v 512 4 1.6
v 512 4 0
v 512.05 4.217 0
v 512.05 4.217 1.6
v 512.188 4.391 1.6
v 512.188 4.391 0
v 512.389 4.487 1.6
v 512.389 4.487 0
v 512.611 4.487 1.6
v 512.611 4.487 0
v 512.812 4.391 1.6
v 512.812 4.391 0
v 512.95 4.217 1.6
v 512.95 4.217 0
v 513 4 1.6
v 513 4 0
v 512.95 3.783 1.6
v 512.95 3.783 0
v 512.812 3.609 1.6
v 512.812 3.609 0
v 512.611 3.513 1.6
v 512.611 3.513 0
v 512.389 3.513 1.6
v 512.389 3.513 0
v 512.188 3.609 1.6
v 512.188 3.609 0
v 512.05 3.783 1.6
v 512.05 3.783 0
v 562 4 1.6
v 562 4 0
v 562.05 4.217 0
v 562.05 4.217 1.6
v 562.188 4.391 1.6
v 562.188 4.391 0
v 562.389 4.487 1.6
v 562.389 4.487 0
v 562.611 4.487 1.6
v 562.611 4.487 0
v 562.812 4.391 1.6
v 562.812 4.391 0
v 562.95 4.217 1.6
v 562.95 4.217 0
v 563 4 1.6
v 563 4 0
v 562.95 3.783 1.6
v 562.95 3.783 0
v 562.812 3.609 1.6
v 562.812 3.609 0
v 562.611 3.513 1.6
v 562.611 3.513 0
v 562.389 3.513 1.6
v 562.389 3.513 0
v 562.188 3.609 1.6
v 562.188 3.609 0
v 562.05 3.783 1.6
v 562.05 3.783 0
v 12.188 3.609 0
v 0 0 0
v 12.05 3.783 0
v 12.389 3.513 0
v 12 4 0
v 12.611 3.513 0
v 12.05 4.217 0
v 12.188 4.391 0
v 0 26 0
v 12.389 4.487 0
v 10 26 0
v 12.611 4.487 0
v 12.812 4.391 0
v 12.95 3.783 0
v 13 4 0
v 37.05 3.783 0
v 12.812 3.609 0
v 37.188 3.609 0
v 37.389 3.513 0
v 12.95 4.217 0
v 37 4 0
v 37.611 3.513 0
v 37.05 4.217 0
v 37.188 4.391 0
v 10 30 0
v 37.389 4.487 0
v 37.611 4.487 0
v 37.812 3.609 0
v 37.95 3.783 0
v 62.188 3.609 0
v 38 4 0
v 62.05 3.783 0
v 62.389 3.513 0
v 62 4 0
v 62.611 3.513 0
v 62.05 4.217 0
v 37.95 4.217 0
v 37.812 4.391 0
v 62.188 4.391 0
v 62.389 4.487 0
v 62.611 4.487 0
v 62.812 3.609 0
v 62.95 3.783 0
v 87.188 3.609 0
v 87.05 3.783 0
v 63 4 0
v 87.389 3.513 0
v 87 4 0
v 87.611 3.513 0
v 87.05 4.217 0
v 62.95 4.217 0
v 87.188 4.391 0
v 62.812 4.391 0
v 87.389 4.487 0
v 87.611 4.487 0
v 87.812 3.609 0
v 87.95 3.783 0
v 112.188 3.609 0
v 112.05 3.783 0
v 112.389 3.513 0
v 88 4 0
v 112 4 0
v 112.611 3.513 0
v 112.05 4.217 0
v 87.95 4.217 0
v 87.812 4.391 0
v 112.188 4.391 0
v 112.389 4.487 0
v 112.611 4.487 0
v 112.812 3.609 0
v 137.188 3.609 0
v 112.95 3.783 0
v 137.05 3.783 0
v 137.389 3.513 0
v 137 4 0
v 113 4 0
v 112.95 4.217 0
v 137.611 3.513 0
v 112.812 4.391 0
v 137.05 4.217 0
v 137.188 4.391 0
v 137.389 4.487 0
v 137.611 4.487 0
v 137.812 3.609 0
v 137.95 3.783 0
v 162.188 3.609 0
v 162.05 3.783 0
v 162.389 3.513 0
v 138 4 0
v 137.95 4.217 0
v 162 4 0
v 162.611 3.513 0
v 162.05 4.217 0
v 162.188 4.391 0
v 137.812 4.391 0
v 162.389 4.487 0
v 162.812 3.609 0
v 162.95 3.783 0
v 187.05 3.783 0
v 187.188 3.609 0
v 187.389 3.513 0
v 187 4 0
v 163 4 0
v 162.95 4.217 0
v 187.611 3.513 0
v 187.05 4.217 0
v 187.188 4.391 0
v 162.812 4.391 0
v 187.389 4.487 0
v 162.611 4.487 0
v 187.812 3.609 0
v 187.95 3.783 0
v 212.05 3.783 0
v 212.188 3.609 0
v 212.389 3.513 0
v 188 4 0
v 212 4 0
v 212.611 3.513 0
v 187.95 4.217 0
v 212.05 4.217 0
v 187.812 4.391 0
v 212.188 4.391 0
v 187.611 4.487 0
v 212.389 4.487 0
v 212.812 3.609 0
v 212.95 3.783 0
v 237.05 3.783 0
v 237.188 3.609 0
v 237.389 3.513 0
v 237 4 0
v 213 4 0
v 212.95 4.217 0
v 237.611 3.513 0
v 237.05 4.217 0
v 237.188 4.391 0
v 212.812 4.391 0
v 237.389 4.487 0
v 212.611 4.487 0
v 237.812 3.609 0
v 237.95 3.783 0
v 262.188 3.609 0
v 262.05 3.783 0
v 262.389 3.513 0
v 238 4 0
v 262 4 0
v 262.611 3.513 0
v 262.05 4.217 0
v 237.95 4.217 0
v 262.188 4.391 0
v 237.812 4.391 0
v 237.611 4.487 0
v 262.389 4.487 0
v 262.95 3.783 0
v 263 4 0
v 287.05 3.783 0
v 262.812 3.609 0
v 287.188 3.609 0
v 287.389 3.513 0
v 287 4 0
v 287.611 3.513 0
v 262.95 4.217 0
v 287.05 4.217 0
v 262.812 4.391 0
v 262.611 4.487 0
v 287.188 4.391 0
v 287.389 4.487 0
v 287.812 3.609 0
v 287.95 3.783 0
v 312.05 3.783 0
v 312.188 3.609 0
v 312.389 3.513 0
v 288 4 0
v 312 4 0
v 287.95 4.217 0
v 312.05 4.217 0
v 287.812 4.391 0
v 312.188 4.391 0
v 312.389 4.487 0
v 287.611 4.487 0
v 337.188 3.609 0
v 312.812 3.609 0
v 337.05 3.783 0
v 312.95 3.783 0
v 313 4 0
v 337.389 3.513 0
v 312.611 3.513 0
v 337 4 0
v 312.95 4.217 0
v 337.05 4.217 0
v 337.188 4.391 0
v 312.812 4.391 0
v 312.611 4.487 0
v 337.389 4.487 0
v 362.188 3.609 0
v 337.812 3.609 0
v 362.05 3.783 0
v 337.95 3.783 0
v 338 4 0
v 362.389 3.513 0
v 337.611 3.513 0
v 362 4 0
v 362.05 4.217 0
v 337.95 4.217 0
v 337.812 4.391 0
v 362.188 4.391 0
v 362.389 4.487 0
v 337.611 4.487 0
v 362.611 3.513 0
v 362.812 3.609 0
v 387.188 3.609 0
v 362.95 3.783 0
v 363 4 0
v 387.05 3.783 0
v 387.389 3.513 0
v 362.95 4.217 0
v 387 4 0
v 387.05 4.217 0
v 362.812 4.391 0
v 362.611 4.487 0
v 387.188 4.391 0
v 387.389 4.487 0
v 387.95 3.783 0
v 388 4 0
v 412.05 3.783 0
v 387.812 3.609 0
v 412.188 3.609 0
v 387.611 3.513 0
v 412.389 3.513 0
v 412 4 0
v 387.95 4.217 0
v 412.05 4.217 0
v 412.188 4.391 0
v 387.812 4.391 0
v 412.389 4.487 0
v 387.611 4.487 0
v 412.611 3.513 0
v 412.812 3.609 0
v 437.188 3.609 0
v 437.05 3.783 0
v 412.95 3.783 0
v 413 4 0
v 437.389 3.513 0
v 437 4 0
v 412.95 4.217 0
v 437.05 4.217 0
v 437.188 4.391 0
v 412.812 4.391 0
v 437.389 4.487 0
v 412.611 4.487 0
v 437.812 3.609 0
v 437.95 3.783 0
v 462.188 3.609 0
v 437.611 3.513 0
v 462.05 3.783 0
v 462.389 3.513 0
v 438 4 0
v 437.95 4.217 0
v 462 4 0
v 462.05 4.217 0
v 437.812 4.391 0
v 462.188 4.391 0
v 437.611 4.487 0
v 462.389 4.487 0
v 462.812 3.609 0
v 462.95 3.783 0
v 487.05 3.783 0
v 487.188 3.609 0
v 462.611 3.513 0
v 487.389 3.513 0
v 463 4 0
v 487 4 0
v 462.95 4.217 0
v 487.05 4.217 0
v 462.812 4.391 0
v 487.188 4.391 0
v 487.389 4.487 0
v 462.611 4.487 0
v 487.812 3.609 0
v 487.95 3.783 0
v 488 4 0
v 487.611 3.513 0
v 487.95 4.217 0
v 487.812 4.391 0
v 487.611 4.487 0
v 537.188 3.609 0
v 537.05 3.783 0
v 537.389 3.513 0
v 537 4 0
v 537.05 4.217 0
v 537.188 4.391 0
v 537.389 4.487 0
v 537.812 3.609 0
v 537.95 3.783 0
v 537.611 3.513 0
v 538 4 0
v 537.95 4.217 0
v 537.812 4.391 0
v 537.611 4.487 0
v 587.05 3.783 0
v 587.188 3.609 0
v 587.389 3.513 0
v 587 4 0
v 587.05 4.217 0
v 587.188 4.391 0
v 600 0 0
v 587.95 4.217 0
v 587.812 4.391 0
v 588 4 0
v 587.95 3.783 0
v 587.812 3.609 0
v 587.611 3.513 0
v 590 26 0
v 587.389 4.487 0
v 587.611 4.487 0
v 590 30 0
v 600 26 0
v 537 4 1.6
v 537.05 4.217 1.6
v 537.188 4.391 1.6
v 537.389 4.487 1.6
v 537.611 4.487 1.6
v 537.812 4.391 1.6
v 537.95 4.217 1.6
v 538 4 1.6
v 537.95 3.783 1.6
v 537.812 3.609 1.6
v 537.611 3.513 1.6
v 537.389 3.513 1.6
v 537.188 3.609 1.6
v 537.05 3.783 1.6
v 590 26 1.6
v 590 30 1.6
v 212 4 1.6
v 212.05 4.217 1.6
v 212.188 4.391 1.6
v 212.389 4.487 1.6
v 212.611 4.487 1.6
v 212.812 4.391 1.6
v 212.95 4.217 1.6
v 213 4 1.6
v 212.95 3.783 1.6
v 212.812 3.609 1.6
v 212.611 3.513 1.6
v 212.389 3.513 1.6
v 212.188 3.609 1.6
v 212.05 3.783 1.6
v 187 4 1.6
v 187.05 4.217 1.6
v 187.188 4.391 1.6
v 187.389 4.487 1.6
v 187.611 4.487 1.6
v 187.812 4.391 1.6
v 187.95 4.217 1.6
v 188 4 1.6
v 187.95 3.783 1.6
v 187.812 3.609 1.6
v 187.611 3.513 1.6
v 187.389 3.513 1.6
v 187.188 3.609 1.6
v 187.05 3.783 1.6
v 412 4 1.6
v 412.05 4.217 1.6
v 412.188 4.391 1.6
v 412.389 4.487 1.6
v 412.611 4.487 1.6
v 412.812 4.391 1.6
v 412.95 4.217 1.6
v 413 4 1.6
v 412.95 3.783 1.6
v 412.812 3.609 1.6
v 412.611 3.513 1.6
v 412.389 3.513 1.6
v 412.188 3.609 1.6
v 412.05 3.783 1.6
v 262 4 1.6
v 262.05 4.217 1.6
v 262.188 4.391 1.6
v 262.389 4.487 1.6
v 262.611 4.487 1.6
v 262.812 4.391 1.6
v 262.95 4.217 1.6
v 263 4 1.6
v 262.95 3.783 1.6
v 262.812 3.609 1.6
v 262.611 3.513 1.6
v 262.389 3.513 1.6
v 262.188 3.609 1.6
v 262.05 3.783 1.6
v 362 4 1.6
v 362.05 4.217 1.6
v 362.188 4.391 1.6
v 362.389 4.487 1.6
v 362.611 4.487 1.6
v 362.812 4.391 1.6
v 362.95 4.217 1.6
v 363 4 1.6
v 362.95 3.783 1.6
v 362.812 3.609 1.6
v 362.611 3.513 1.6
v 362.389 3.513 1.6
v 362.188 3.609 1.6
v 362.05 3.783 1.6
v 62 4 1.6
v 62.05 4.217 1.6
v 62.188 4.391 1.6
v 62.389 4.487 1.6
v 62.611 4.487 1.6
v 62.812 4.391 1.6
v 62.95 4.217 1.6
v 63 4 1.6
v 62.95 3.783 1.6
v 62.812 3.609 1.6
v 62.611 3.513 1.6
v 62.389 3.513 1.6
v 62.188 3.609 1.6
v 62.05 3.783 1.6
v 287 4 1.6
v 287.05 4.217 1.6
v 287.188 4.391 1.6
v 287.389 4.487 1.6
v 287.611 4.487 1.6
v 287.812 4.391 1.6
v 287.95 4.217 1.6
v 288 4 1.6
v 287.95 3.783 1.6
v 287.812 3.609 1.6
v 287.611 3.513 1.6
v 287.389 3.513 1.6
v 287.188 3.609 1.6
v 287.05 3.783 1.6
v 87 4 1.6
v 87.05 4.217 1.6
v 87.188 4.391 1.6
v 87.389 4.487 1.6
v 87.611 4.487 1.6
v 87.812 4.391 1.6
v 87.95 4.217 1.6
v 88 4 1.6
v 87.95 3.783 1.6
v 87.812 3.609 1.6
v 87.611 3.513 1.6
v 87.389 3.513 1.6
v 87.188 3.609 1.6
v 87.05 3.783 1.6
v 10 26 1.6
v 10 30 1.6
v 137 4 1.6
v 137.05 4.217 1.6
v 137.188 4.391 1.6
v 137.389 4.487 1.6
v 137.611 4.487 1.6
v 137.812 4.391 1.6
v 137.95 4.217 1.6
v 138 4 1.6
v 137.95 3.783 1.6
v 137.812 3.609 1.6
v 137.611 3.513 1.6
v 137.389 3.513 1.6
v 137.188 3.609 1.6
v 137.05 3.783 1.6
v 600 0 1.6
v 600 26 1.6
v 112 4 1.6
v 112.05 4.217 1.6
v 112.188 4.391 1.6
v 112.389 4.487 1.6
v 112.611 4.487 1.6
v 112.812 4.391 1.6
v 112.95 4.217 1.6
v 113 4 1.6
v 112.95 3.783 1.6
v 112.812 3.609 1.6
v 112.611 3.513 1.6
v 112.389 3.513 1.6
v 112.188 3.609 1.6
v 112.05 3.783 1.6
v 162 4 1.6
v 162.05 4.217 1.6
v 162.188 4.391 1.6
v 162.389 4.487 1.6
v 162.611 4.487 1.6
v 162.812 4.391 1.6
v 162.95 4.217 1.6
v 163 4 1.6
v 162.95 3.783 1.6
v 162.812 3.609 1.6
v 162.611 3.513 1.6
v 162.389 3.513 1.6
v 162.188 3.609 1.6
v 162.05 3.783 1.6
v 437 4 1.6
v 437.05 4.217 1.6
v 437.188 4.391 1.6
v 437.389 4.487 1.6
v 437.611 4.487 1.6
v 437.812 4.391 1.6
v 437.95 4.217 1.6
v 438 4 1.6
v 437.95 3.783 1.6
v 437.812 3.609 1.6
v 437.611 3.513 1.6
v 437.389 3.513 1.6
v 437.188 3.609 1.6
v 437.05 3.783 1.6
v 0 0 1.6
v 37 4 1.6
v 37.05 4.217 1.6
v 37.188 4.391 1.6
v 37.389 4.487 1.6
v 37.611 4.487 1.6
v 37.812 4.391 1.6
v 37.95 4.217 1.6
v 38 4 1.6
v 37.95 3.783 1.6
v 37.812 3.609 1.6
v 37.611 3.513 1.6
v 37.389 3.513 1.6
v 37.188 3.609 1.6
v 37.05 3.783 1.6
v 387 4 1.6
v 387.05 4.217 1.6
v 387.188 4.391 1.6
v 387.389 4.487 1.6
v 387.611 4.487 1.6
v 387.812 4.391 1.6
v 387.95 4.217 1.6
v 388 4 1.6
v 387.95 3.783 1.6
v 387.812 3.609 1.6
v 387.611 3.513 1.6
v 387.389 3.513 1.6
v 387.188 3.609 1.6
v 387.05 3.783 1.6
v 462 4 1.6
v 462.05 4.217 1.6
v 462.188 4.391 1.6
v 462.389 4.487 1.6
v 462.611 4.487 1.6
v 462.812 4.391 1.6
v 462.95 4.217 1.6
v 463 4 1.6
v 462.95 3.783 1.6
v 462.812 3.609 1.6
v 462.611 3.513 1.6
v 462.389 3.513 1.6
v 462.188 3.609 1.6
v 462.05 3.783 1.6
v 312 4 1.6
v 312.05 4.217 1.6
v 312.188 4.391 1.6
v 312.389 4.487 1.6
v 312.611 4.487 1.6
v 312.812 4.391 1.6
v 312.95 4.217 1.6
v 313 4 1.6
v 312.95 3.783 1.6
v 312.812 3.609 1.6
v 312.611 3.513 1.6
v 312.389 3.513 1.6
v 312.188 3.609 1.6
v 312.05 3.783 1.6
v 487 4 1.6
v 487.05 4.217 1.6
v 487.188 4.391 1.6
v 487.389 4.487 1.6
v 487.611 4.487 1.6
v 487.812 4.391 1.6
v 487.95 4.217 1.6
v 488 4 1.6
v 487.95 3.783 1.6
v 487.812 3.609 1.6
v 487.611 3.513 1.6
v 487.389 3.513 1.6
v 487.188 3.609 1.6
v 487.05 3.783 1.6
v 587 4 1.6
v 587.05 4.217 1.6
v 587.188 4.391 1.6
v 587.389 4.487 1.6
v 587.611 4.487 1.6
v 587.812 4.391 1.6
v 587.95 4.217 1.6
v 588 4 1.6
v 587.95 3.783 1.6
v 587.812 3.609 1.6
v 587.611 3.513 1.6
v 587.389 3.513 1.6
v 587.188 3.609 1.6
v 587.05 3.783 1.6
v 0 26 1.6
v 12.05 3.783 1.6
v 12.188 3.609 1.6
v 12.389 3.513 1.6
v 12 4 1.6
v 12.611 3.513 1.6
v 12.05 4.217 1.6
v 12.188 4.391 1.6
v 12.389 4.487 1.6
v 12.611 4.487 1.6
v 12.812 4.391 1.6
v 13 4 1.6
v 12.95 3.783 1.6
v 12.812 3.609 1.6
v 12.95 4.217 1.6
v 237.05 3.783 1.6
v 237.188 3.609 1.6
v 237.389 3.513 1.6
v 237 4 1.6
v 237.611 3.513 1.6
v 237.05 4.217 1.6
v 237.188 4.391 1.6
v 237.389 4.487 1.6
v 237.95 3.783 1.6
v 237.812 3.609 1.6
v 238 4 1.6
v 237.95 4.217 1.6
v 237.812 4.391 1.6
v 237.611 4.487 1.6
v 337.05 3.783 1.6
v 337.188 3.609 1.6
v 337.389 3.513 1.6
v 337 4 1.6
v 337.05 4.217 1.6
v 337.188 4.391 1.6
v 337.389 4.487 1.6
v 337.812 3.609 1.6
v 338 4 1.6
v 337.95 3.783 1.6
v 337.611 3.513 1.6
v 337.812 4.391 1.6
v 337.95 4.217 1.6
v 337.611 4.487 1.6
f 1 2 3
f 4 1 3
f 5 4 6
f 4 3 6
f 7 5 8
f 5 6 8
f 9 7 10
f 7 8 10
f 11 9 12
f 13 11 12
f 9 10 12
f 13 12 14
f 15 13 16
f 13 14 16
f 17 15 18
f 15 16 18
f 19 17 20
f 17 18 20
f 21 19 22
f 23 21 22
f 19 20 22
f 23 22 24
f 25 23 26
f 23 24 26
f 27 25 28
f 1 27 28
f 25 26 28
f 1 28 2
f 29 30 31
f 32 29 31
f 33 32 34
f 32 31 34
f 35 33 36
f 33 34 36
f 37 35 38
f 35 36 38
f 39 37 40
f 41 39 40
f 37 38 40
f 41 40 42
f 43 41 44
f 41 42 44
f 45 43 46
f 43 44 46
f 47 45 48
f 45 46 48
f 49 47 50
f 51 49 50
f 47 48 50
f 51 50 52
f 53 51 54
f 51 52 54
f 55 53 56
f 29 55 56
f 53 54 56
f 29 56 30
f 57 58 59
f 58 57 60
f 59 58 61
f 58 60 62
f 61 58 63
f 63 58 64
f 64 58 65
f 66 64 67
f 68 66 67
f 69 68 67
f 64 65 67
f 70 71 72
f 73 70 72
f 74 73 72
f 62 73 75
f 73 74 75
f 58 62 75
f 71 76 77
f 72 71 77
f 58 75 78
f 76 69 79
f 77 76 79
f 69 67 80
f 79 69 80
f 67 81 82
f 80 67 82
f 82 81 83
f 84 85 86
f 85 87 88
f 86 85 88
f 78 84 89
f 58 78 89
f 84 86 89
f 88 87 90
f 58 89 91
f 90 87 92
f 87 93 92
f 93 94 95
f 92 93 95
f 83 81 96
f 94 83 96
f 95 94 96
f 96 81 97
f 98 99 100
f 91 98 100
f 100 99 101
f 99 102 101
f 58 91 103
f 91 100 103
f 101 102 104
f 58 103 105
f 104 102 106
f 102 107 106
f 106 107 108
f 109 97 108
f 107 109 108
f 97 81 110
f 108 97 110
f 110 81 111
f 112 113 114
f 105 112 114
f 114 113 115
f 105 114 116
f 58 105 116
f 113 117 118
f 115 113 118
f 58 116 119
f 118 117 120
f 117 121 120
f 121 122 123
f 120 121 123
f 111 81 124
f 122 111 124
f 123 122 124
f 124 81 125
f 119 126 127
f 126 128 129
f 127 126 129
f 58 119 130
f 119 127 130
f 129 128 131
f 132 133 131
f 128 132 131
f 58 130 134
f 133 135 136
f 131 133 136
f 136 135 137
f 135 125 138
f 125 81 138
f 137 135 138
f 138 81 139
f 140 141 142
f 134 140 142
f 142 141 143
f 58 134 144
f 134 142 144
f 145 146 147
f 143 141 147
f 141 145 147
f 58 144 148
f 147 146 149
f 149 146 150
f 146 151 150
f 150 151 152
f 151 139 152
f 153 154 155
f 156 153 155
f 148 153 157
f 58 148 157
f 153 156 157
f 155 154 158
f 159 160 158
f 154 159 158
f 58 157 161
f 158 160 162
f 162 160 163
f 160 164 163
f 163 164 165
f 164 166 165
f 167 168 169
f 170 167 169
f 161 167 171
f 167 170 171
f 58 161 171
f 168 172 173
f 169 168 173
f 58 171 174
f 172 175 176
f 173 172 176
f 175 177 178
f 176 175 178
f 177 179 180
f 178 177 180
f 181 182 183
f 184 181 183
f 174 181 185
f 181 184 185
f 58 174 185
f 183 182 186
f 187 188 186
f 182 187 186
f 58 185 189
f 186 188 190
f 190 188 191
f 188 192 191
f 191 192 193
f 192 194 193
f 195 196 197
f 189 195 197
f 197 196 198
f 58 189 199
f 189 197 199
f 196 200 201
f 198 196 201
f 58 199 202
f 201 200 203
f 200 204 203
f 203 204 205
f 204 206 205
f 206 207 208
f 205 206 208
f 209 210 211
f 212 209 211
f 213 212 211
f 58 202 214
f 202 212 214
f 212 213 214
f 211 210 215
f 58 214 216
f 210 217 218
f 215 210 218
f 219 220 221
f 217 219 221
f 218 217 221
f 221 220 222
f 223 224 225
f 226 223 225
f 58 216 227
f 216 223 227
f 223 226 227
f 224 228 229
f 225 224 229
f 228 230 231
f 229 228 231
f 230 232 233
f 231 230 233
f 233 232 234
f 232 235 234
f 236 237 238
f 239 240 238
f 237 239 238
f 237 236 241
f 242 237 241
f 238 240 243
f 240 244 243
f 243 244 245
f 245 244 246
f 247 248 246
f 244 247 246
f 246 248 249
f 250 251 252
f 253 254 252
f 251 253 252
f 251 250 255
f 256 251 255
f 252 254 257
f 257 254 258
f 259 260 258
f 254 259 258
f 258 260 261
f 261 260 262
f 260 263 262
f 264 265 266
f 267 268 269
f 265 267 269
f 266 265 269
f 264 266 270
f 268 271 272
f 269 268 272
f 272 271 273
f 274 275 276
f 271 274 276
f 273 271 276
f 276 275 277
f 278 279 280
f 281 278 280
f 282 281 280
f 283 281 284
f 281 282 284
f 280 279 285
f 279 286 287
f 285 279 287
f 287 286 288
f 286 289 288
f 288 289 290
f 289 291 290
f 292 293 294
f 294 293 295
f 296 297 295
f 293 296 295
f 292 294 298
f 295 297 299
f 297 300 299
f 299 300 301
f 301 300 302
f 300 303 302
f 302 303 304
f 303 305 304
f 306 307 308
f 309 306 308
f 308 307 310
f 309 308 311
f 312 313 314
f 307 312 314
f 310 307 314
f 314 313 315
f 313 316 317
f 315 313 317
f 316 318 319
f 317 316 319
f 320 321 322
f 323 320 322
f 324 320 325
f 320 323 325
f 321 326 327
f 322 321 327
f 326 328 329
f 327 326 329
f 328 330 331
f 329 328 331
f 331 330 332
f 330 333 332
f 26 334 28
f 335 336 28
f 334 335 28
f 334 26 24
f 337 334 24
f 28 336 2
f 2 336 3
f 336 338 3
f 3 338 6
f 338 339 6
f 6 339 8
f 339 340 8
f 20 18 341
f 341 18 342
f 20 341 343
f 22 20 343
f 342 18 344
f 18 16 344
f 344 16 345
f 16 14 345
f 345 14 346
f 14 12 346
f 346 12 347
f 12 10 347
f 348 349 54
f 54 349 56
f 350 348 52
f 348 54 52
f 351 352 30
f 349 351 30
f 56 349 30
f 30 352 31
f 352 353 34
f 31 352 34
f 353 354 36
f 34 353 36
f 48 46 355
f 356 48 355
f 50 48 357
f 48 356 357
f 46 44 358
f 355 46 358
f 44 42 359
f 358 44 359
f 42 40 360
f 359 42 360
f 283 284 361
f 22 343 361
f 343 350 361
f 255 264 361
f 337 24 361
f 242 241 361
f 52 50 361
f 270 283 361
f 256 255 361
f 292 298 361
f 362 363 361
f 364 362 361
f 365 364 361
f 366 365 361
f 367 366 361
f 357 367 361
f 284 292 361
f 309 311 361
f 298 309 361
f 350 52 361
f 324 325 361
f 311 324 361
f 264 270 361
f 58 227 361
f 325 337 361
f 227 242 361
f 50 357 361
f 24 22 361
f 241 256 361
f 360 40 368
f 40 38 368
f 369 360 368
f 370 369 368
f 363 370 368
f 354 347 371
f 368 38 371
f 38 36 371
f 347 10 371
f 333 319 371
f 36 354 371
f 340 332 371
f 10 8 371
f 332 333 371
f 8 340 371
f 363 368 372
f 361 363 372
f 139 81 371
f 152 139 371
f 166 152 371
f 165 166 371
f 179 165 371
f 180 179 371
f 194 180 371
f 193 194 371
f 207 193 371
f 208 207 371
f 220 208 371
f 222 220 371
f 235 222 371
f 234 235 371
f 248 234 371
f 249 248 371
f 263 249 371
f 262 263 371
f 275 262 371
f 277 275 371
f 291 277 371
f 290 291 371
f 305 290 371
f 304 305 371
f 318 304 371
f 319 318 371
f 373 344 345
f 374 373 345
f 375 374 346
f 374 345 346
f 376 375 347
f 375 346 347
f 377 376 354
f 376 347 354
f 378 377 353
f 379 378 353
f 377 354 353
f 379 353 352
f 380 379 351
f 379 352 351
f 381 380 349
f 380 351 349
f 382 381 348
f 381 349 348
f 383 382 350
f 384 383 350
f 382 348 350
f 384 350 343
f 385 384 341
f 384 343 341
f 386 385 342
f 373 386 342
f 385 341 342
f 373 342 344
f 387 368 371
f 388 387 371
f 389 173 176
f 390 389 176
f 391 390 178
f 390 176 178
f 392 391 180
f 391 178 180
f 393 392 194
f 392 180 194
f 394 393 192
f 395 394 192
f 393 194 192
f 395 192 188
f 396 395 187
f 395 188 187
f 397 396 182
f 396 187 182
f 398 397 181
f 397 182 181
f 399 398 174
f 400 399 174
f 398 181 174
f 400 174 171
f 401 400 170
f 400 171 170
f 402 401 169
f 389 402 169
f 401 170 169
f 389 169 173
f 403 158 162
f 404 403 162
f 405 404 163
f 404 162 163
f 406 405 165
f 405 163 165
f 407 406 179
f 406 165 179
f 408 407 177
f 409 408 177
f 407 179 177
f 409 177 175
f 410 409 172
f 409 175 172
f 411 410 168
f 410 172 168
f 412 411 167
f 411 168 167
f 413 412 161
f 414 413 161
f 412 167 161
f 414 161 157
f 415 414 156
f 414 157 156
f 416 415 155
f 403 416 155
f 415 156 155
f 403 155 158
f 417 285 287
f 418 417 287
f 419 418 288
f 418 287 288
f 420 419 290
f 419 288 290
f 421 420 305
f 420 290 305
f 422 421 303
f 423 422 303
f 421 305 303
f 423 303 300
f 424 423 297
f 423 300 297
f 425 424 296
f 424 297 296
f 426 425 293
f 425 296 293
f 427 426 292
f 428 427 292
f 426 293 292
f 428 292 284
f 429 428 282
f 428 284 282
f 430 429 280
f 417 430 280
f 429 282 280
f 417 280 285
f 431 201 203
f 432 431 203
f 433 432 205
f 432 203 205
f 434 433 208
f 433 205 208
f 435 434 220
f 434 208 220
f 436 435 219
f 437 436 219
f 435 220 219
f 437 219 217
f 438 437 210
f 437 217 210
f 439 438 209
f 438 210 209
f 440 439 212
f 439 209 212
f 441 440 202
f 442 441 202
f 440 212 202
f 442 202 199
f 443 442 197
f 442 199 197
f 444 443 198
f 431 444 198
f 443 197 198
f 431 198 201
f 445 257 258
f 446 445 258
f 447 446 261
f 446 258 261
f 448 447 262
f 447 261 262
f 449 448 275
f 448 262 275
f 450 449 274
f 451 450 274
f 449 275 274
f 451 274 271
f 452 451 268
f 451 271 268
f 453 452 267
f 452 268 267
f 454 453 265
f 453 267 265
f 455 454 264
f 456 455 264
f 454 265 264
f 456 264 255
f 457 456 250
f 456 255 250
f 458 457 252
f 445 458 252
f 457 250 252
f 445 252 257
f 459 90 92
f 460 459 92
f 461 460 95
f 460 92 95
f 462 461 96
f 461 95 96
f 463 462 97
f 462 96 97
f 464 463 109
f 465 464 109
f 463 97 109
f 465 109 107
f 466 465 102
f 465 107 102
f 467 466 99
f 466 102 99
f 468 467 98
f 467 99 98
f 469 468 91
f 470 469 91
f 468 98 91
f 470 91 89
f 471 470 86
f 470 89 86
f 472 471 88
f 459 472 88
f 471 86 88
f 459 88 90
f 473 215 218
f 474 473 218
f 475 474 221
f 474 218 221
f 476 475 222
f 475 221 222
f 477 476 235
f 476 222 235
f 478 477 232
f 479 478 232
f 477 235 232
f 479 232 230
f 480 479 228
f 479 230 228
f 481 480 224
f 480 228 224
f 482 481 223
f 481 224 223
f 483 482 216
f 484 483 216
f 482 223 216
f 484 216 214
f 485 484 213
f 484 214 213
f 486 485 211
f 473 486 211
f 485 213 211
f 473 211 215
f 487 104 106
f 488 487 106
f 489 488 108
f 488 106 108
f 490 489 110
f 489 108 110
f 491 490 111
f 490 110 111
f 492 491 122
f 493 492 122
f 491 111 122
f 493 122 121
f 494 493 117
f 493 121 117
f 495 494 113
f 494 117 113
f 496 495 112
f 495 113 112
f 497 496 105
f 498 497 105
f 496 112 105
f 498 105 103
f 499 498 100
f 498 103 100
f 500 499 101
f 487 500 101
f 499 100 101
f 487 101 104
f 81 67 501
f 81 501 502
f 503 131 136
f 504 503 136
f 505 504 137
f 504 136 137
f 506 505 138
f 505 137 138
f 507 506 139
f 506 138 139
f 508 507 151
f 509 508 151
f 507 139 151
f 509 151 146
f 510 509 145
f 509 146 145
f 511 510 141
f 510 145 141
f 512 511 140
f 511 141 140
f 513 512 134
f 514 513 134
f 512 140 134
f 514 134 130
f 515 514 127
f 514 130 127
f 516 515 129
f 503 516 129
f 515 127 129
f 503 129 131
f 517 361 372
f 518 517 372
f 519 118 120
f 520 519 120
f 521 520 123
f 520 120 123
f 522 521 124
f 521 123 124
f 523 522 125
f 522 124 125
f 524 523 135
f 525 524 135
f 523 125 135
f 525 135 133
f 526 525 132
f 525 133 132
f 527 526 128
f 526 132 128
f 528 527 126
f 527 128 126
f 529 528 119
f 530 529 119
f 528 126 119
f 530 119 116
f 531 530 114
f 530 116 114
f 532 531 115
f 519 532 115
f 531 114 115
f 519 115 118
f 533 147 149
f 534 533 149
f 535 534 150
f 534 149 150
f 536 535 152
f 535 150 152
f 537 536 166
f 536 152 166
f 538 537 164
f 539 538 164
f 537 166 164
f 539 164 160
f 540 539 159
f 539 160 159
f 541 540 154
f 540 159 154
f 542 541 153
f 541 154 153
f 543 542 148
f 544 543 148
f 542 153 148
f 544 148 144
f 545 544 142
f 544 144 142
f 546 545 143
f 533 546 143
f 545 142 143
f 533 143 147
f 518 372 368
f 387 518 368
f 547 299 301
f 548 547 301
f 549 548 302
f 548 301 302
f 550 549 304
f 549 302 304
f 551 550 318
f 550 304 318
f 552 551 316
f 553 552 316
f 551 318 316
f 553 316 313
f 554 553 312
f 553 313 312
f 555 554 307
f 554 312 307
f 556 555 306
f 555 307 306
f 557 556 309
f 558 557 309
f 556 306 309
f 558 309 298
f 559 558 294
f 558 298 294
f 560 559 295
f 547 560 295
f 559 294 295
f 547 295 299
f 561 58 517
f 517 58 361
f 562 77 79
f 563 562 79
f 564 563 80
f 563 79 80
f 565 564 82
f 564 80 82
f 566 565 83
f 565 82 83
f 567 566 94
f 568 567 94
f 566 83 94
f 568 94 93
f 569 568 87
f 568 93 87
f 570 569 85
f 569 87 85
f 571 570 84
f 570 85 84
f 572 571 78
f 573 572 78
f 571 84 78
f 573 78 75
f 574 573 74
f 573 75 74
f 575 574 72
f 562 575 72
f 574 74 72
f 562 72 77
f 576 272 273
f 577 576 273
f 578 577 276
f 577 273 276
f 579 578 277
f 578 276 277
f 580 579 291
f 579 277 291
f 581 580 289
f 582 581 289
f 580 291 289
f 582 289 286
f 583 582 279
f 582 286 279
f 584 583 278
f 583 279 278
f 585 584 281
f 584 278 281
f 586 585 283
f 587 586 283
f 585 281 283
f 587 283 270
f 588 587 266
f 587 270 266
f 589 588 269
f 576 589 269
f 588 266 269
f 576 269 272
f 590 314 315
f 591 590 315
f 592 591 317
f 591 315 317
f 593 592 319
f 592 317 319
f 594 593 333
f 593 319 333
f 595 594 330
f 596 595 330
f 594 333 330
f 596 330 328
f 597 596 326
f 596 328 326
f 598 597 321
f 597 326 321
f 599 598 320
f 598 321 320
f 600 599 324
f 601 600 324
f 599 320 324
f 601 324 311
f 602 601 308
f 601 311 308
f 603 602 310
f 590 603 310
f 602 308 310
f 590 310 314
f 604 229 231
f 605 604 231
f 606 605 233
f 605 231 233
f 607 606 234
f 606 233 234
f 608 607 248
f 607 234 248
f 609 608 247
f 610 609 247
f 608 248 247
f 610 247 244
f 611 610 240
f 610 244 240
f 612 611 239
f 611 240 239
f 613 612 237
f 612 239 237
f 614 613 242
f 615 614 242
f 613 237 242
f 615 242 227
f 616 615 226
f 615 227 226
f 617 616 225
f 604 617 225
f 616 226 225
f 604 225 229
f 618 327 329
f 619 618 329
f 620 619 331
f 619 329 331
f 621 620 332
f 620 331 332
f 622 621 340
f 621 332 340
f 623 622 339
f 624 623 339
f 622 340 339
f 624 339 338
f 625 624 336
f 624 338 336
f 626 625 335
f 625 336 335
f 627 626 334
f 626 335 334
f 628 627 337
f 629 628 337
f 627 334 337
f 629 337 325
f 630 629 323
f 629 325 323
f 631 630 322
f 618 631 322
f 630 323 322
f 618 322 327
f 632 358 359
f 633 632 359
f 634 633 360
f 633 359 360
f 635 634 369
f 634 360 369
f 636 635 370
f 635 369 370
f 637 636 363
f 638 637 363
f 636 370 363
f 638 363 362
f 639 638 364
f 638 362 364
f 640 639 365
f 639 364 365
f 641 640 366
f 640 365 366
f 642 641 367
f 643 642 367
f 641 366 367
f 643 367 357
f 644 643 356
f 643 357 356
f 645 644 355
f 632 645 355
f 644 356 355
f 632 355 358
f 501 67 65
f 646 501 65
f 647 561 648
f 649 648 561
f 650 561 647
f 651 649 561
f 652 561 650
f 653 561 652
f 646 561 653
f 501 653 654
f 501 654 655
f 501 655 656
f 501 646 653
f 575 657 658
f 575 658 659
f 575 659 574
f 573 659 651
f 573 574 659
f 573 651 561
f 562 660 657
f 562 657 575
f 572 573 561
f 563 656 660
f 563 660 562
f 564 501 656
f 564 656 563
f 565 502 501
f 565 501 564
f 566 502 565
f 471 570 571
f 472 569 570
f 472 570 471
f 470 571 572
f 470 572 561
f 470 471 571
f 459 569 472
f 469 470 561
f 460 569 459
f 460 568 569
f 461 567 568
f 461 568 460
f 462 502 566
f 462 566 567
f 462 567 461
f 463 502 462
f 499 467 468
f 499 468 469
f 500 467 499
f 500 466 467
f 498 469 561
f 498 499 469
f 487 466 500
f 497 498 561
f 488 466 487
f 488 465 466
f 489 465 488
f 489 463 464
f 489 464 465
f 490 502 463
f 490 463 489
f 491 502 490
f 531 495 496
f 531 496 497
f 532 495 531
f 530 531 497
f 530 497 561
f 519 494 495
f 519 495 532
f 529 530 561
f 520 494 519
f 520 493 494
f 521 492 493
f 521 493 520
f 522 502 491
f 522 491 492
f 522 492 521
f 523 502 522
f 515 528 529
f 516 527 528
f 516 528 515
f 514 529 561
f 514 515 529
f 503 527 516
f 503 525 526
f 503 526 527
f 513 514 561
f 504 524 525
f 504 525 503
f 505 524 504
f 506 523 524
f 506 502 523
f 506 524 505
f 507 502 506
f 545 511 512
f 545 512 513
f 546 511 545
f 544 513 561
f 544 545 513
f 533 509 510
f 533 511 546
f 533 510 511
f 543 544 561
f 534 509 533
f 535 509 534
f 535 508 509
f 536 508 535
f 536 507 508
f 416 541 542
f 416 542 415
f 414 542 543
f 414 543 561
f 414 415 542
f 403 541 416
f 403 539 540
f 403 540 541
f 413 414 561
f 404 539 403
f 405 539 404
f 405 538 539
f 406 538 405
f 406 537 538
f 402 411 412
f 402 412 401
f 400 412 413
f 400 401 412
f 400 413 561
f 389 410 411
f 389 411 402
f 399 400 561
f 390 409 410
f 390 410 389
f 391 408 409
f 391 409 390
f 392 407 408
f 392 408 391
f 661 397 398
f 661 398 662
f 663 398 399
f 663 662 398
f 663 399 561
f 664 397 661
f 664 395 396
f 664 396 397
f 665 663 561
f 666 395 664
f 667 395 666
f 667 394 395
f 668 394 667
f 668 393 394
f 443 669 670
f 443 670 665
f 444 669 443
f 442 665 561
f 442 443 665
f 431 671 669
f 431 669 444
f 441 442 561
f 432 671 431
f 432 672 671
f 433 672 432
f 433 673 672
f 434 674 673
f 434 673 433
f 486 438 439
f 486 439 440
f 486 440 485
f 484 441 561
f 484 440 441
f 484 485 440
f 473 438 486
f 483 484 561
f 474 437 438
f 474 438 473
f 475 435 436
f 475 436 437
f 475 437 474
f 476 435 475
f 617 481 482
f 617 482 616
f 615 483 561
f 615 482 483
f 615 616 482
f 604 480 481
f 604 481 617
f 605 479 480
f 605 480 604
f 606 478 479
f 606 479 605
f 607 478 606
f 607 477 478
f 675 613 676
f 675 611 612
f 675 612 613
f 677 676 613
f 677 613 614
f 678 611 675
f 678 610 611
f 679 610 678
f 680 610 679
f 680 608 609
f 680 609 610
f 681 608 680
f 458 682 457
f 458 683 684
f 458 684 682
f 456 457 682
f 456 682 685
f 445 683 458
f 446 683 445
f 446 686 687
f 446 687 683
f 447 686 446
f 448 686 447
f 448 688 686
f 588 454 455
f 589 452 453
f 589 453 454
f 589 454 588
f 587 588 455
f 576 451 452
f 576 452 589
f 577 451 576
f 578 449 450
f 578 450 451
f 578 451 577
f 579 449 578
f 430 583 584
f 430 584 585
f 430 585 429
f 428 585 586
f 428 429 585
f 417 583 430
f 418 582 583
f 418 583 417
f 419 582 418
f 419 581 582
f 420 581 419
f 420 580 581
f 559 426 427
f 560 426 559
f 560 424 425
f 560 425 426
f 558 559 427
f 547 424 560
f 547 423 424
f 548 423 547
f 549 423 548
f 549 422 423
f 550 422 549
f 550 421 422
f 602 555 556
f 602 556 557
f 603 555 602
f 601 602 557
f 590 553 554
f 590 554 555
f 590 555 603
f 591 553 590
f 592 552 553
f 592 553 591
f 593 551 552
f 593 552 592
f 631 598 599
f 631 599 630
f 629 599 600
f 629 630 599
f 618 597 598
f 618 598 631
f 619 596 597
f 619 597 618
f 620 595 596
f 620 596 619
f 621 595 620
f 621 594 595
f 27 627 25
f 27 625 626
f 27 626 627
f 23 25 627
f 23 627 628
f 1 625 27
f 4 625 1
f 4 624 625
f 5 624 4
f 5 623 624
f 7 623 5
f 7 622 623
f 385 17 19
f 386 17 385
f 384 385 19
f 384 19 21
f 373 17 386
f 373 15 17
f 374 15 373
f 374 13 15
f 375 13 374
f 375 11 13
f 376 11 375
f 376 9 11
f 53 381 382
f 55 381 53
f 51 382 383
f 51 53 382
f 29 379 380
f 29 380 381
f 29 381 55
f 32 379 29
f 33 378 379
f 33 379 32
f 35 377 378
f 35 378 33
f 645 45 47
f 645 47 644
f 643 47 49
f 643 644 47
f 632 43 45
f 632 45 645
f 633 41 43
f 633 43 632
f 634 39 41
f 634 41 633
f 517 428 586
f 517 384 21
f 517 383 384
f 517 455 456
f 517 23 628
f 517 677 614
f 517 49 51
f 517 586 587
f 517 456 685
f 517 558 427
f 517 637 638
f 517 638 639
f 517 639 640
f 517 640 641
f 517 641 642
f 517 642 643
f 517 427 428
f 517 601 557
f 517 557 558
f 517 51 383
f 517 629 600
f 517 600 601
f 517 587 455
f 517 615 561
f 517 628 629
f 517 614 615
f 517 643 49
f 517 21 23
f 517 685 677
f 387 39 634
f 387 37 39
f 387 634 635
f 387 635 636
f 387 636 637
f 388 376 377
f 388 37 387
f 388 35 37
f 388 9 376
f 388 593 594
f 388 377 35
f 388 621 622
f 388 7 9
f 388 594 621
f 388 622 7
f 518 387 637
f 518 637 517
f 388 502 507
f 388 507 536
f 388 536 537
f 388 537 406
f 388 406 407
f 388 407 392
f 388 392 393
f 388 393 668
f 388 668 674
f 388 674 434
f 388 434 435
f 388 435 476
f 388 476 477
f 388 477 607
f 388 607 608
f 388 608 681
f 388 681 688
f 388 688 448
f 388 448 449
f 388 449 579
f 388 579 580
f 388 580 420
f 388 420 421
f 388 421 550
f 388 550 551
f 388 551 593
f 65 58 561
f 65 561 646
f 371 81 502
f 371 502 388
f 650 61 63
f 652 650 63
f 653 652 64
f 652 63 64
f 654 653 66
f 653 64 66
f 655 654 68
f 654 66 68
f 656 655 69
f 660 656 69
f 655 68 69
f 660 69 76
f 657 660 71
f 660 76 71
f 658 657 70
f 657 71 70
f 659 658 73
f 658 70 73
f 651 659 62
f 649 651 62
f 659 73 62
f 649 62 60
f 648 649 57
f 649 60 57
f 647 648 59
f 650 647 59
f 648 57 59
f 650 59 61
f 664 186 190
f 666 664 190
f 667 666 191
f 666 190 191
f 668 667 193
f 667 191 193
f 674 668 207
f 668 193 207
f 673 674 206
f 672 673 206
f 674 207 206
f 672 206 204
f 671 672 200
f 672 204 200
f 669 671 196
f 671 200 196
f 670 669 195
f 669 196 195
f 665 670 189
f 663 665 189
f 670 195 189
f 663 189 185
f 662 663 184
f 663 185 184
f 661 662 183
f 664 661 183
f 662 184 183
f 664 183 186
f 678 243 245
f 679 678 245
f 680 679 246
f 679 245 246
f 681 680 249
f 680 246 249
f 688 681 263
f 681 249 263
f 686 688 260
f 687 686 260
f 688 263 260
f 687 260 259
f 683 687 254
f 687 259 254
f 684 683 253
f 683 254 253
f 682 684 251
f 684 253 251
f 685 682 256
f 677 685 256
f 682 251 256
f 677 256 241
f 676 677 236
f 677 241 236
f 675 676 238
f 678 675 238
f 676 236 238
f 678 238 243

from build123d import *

# Parameters (mm, degrees)
ESQUISSE1_W                = 600
ESQUISSE1_H                = 30
BOSS_EXTRU_1_DEPTH         = 1.6
ESQUISSE5_R                = 0.5
ENL_V_MAT_EXTRU_2_DEPTH    = 50
R_P_TITION_LIN_AIRE3_COUNT = 24
R_P_TITION_LIN_AIRE3_PITCH = 25
ESQUISSE6_W                = 10
ESQUISSE6_H                = 4
ENL_V_MAT_EXTRU_3_DEPTH    = 30


with BuildPart() as part:
    # Esquisse1 → Boss.-Extru.1 (new body)
    with BuildSketch(Plane.XY):
        with Locations((300, 15)):
            Rectangle(ESQUISSE1_W, ESQUISSE1_H)
    extrude(amount=BOSS_EXTRU_1_DEPTH)

    # Esquisse5 → Enlèv. mat.-Extru.2 (cut)
    with BuildSketch(Plane(origin=(0, 0, 0), x_dir=(-1, 0, 0), z_dir=(0, 0, -1))):
        with Locations((-587.5, 4)):
            Circle(ESQUISSE5_R)
    enl_v_mat_extru_2 = extrude(amount=-ENL_V_MAT_EXTRU_2_DEPTH, mode=Mode.SUBTRACT)

    # Répétition linéaire3: Enlèv. mat.-Extru.2 ×24
    with Locations(*[(-i * R_P_TITION_LIN_AIRE3_PITCH, 0, 0) for i in range(1, R_P_TITION_LIN_AIRE3_COUNT)]):
        add(enl_v_mat_extru_2, mode=Mode.SUBTRACT)

    # Esquisse6 → Enlèv. mat.-Extru.3 (cut)
    with BuildSketch(Plane(origin=(0, 0, 0), x_dir=(-1, 0, 0), z_dir=(0, 0, -1))):
        with Locations((-595, 28)):
            Rectangle(ESQUISSE6_W, ESQUISSE6_H)
        with Locations((-5, 28)):
            Rectangle(ESQUISSE6_W, ESQUISSE6_H)
    extrude(amount=-ENL_V_MAT_EXTRU_3_DEPTH, mode=Mode.SUBTRACT)


solid = part.part
